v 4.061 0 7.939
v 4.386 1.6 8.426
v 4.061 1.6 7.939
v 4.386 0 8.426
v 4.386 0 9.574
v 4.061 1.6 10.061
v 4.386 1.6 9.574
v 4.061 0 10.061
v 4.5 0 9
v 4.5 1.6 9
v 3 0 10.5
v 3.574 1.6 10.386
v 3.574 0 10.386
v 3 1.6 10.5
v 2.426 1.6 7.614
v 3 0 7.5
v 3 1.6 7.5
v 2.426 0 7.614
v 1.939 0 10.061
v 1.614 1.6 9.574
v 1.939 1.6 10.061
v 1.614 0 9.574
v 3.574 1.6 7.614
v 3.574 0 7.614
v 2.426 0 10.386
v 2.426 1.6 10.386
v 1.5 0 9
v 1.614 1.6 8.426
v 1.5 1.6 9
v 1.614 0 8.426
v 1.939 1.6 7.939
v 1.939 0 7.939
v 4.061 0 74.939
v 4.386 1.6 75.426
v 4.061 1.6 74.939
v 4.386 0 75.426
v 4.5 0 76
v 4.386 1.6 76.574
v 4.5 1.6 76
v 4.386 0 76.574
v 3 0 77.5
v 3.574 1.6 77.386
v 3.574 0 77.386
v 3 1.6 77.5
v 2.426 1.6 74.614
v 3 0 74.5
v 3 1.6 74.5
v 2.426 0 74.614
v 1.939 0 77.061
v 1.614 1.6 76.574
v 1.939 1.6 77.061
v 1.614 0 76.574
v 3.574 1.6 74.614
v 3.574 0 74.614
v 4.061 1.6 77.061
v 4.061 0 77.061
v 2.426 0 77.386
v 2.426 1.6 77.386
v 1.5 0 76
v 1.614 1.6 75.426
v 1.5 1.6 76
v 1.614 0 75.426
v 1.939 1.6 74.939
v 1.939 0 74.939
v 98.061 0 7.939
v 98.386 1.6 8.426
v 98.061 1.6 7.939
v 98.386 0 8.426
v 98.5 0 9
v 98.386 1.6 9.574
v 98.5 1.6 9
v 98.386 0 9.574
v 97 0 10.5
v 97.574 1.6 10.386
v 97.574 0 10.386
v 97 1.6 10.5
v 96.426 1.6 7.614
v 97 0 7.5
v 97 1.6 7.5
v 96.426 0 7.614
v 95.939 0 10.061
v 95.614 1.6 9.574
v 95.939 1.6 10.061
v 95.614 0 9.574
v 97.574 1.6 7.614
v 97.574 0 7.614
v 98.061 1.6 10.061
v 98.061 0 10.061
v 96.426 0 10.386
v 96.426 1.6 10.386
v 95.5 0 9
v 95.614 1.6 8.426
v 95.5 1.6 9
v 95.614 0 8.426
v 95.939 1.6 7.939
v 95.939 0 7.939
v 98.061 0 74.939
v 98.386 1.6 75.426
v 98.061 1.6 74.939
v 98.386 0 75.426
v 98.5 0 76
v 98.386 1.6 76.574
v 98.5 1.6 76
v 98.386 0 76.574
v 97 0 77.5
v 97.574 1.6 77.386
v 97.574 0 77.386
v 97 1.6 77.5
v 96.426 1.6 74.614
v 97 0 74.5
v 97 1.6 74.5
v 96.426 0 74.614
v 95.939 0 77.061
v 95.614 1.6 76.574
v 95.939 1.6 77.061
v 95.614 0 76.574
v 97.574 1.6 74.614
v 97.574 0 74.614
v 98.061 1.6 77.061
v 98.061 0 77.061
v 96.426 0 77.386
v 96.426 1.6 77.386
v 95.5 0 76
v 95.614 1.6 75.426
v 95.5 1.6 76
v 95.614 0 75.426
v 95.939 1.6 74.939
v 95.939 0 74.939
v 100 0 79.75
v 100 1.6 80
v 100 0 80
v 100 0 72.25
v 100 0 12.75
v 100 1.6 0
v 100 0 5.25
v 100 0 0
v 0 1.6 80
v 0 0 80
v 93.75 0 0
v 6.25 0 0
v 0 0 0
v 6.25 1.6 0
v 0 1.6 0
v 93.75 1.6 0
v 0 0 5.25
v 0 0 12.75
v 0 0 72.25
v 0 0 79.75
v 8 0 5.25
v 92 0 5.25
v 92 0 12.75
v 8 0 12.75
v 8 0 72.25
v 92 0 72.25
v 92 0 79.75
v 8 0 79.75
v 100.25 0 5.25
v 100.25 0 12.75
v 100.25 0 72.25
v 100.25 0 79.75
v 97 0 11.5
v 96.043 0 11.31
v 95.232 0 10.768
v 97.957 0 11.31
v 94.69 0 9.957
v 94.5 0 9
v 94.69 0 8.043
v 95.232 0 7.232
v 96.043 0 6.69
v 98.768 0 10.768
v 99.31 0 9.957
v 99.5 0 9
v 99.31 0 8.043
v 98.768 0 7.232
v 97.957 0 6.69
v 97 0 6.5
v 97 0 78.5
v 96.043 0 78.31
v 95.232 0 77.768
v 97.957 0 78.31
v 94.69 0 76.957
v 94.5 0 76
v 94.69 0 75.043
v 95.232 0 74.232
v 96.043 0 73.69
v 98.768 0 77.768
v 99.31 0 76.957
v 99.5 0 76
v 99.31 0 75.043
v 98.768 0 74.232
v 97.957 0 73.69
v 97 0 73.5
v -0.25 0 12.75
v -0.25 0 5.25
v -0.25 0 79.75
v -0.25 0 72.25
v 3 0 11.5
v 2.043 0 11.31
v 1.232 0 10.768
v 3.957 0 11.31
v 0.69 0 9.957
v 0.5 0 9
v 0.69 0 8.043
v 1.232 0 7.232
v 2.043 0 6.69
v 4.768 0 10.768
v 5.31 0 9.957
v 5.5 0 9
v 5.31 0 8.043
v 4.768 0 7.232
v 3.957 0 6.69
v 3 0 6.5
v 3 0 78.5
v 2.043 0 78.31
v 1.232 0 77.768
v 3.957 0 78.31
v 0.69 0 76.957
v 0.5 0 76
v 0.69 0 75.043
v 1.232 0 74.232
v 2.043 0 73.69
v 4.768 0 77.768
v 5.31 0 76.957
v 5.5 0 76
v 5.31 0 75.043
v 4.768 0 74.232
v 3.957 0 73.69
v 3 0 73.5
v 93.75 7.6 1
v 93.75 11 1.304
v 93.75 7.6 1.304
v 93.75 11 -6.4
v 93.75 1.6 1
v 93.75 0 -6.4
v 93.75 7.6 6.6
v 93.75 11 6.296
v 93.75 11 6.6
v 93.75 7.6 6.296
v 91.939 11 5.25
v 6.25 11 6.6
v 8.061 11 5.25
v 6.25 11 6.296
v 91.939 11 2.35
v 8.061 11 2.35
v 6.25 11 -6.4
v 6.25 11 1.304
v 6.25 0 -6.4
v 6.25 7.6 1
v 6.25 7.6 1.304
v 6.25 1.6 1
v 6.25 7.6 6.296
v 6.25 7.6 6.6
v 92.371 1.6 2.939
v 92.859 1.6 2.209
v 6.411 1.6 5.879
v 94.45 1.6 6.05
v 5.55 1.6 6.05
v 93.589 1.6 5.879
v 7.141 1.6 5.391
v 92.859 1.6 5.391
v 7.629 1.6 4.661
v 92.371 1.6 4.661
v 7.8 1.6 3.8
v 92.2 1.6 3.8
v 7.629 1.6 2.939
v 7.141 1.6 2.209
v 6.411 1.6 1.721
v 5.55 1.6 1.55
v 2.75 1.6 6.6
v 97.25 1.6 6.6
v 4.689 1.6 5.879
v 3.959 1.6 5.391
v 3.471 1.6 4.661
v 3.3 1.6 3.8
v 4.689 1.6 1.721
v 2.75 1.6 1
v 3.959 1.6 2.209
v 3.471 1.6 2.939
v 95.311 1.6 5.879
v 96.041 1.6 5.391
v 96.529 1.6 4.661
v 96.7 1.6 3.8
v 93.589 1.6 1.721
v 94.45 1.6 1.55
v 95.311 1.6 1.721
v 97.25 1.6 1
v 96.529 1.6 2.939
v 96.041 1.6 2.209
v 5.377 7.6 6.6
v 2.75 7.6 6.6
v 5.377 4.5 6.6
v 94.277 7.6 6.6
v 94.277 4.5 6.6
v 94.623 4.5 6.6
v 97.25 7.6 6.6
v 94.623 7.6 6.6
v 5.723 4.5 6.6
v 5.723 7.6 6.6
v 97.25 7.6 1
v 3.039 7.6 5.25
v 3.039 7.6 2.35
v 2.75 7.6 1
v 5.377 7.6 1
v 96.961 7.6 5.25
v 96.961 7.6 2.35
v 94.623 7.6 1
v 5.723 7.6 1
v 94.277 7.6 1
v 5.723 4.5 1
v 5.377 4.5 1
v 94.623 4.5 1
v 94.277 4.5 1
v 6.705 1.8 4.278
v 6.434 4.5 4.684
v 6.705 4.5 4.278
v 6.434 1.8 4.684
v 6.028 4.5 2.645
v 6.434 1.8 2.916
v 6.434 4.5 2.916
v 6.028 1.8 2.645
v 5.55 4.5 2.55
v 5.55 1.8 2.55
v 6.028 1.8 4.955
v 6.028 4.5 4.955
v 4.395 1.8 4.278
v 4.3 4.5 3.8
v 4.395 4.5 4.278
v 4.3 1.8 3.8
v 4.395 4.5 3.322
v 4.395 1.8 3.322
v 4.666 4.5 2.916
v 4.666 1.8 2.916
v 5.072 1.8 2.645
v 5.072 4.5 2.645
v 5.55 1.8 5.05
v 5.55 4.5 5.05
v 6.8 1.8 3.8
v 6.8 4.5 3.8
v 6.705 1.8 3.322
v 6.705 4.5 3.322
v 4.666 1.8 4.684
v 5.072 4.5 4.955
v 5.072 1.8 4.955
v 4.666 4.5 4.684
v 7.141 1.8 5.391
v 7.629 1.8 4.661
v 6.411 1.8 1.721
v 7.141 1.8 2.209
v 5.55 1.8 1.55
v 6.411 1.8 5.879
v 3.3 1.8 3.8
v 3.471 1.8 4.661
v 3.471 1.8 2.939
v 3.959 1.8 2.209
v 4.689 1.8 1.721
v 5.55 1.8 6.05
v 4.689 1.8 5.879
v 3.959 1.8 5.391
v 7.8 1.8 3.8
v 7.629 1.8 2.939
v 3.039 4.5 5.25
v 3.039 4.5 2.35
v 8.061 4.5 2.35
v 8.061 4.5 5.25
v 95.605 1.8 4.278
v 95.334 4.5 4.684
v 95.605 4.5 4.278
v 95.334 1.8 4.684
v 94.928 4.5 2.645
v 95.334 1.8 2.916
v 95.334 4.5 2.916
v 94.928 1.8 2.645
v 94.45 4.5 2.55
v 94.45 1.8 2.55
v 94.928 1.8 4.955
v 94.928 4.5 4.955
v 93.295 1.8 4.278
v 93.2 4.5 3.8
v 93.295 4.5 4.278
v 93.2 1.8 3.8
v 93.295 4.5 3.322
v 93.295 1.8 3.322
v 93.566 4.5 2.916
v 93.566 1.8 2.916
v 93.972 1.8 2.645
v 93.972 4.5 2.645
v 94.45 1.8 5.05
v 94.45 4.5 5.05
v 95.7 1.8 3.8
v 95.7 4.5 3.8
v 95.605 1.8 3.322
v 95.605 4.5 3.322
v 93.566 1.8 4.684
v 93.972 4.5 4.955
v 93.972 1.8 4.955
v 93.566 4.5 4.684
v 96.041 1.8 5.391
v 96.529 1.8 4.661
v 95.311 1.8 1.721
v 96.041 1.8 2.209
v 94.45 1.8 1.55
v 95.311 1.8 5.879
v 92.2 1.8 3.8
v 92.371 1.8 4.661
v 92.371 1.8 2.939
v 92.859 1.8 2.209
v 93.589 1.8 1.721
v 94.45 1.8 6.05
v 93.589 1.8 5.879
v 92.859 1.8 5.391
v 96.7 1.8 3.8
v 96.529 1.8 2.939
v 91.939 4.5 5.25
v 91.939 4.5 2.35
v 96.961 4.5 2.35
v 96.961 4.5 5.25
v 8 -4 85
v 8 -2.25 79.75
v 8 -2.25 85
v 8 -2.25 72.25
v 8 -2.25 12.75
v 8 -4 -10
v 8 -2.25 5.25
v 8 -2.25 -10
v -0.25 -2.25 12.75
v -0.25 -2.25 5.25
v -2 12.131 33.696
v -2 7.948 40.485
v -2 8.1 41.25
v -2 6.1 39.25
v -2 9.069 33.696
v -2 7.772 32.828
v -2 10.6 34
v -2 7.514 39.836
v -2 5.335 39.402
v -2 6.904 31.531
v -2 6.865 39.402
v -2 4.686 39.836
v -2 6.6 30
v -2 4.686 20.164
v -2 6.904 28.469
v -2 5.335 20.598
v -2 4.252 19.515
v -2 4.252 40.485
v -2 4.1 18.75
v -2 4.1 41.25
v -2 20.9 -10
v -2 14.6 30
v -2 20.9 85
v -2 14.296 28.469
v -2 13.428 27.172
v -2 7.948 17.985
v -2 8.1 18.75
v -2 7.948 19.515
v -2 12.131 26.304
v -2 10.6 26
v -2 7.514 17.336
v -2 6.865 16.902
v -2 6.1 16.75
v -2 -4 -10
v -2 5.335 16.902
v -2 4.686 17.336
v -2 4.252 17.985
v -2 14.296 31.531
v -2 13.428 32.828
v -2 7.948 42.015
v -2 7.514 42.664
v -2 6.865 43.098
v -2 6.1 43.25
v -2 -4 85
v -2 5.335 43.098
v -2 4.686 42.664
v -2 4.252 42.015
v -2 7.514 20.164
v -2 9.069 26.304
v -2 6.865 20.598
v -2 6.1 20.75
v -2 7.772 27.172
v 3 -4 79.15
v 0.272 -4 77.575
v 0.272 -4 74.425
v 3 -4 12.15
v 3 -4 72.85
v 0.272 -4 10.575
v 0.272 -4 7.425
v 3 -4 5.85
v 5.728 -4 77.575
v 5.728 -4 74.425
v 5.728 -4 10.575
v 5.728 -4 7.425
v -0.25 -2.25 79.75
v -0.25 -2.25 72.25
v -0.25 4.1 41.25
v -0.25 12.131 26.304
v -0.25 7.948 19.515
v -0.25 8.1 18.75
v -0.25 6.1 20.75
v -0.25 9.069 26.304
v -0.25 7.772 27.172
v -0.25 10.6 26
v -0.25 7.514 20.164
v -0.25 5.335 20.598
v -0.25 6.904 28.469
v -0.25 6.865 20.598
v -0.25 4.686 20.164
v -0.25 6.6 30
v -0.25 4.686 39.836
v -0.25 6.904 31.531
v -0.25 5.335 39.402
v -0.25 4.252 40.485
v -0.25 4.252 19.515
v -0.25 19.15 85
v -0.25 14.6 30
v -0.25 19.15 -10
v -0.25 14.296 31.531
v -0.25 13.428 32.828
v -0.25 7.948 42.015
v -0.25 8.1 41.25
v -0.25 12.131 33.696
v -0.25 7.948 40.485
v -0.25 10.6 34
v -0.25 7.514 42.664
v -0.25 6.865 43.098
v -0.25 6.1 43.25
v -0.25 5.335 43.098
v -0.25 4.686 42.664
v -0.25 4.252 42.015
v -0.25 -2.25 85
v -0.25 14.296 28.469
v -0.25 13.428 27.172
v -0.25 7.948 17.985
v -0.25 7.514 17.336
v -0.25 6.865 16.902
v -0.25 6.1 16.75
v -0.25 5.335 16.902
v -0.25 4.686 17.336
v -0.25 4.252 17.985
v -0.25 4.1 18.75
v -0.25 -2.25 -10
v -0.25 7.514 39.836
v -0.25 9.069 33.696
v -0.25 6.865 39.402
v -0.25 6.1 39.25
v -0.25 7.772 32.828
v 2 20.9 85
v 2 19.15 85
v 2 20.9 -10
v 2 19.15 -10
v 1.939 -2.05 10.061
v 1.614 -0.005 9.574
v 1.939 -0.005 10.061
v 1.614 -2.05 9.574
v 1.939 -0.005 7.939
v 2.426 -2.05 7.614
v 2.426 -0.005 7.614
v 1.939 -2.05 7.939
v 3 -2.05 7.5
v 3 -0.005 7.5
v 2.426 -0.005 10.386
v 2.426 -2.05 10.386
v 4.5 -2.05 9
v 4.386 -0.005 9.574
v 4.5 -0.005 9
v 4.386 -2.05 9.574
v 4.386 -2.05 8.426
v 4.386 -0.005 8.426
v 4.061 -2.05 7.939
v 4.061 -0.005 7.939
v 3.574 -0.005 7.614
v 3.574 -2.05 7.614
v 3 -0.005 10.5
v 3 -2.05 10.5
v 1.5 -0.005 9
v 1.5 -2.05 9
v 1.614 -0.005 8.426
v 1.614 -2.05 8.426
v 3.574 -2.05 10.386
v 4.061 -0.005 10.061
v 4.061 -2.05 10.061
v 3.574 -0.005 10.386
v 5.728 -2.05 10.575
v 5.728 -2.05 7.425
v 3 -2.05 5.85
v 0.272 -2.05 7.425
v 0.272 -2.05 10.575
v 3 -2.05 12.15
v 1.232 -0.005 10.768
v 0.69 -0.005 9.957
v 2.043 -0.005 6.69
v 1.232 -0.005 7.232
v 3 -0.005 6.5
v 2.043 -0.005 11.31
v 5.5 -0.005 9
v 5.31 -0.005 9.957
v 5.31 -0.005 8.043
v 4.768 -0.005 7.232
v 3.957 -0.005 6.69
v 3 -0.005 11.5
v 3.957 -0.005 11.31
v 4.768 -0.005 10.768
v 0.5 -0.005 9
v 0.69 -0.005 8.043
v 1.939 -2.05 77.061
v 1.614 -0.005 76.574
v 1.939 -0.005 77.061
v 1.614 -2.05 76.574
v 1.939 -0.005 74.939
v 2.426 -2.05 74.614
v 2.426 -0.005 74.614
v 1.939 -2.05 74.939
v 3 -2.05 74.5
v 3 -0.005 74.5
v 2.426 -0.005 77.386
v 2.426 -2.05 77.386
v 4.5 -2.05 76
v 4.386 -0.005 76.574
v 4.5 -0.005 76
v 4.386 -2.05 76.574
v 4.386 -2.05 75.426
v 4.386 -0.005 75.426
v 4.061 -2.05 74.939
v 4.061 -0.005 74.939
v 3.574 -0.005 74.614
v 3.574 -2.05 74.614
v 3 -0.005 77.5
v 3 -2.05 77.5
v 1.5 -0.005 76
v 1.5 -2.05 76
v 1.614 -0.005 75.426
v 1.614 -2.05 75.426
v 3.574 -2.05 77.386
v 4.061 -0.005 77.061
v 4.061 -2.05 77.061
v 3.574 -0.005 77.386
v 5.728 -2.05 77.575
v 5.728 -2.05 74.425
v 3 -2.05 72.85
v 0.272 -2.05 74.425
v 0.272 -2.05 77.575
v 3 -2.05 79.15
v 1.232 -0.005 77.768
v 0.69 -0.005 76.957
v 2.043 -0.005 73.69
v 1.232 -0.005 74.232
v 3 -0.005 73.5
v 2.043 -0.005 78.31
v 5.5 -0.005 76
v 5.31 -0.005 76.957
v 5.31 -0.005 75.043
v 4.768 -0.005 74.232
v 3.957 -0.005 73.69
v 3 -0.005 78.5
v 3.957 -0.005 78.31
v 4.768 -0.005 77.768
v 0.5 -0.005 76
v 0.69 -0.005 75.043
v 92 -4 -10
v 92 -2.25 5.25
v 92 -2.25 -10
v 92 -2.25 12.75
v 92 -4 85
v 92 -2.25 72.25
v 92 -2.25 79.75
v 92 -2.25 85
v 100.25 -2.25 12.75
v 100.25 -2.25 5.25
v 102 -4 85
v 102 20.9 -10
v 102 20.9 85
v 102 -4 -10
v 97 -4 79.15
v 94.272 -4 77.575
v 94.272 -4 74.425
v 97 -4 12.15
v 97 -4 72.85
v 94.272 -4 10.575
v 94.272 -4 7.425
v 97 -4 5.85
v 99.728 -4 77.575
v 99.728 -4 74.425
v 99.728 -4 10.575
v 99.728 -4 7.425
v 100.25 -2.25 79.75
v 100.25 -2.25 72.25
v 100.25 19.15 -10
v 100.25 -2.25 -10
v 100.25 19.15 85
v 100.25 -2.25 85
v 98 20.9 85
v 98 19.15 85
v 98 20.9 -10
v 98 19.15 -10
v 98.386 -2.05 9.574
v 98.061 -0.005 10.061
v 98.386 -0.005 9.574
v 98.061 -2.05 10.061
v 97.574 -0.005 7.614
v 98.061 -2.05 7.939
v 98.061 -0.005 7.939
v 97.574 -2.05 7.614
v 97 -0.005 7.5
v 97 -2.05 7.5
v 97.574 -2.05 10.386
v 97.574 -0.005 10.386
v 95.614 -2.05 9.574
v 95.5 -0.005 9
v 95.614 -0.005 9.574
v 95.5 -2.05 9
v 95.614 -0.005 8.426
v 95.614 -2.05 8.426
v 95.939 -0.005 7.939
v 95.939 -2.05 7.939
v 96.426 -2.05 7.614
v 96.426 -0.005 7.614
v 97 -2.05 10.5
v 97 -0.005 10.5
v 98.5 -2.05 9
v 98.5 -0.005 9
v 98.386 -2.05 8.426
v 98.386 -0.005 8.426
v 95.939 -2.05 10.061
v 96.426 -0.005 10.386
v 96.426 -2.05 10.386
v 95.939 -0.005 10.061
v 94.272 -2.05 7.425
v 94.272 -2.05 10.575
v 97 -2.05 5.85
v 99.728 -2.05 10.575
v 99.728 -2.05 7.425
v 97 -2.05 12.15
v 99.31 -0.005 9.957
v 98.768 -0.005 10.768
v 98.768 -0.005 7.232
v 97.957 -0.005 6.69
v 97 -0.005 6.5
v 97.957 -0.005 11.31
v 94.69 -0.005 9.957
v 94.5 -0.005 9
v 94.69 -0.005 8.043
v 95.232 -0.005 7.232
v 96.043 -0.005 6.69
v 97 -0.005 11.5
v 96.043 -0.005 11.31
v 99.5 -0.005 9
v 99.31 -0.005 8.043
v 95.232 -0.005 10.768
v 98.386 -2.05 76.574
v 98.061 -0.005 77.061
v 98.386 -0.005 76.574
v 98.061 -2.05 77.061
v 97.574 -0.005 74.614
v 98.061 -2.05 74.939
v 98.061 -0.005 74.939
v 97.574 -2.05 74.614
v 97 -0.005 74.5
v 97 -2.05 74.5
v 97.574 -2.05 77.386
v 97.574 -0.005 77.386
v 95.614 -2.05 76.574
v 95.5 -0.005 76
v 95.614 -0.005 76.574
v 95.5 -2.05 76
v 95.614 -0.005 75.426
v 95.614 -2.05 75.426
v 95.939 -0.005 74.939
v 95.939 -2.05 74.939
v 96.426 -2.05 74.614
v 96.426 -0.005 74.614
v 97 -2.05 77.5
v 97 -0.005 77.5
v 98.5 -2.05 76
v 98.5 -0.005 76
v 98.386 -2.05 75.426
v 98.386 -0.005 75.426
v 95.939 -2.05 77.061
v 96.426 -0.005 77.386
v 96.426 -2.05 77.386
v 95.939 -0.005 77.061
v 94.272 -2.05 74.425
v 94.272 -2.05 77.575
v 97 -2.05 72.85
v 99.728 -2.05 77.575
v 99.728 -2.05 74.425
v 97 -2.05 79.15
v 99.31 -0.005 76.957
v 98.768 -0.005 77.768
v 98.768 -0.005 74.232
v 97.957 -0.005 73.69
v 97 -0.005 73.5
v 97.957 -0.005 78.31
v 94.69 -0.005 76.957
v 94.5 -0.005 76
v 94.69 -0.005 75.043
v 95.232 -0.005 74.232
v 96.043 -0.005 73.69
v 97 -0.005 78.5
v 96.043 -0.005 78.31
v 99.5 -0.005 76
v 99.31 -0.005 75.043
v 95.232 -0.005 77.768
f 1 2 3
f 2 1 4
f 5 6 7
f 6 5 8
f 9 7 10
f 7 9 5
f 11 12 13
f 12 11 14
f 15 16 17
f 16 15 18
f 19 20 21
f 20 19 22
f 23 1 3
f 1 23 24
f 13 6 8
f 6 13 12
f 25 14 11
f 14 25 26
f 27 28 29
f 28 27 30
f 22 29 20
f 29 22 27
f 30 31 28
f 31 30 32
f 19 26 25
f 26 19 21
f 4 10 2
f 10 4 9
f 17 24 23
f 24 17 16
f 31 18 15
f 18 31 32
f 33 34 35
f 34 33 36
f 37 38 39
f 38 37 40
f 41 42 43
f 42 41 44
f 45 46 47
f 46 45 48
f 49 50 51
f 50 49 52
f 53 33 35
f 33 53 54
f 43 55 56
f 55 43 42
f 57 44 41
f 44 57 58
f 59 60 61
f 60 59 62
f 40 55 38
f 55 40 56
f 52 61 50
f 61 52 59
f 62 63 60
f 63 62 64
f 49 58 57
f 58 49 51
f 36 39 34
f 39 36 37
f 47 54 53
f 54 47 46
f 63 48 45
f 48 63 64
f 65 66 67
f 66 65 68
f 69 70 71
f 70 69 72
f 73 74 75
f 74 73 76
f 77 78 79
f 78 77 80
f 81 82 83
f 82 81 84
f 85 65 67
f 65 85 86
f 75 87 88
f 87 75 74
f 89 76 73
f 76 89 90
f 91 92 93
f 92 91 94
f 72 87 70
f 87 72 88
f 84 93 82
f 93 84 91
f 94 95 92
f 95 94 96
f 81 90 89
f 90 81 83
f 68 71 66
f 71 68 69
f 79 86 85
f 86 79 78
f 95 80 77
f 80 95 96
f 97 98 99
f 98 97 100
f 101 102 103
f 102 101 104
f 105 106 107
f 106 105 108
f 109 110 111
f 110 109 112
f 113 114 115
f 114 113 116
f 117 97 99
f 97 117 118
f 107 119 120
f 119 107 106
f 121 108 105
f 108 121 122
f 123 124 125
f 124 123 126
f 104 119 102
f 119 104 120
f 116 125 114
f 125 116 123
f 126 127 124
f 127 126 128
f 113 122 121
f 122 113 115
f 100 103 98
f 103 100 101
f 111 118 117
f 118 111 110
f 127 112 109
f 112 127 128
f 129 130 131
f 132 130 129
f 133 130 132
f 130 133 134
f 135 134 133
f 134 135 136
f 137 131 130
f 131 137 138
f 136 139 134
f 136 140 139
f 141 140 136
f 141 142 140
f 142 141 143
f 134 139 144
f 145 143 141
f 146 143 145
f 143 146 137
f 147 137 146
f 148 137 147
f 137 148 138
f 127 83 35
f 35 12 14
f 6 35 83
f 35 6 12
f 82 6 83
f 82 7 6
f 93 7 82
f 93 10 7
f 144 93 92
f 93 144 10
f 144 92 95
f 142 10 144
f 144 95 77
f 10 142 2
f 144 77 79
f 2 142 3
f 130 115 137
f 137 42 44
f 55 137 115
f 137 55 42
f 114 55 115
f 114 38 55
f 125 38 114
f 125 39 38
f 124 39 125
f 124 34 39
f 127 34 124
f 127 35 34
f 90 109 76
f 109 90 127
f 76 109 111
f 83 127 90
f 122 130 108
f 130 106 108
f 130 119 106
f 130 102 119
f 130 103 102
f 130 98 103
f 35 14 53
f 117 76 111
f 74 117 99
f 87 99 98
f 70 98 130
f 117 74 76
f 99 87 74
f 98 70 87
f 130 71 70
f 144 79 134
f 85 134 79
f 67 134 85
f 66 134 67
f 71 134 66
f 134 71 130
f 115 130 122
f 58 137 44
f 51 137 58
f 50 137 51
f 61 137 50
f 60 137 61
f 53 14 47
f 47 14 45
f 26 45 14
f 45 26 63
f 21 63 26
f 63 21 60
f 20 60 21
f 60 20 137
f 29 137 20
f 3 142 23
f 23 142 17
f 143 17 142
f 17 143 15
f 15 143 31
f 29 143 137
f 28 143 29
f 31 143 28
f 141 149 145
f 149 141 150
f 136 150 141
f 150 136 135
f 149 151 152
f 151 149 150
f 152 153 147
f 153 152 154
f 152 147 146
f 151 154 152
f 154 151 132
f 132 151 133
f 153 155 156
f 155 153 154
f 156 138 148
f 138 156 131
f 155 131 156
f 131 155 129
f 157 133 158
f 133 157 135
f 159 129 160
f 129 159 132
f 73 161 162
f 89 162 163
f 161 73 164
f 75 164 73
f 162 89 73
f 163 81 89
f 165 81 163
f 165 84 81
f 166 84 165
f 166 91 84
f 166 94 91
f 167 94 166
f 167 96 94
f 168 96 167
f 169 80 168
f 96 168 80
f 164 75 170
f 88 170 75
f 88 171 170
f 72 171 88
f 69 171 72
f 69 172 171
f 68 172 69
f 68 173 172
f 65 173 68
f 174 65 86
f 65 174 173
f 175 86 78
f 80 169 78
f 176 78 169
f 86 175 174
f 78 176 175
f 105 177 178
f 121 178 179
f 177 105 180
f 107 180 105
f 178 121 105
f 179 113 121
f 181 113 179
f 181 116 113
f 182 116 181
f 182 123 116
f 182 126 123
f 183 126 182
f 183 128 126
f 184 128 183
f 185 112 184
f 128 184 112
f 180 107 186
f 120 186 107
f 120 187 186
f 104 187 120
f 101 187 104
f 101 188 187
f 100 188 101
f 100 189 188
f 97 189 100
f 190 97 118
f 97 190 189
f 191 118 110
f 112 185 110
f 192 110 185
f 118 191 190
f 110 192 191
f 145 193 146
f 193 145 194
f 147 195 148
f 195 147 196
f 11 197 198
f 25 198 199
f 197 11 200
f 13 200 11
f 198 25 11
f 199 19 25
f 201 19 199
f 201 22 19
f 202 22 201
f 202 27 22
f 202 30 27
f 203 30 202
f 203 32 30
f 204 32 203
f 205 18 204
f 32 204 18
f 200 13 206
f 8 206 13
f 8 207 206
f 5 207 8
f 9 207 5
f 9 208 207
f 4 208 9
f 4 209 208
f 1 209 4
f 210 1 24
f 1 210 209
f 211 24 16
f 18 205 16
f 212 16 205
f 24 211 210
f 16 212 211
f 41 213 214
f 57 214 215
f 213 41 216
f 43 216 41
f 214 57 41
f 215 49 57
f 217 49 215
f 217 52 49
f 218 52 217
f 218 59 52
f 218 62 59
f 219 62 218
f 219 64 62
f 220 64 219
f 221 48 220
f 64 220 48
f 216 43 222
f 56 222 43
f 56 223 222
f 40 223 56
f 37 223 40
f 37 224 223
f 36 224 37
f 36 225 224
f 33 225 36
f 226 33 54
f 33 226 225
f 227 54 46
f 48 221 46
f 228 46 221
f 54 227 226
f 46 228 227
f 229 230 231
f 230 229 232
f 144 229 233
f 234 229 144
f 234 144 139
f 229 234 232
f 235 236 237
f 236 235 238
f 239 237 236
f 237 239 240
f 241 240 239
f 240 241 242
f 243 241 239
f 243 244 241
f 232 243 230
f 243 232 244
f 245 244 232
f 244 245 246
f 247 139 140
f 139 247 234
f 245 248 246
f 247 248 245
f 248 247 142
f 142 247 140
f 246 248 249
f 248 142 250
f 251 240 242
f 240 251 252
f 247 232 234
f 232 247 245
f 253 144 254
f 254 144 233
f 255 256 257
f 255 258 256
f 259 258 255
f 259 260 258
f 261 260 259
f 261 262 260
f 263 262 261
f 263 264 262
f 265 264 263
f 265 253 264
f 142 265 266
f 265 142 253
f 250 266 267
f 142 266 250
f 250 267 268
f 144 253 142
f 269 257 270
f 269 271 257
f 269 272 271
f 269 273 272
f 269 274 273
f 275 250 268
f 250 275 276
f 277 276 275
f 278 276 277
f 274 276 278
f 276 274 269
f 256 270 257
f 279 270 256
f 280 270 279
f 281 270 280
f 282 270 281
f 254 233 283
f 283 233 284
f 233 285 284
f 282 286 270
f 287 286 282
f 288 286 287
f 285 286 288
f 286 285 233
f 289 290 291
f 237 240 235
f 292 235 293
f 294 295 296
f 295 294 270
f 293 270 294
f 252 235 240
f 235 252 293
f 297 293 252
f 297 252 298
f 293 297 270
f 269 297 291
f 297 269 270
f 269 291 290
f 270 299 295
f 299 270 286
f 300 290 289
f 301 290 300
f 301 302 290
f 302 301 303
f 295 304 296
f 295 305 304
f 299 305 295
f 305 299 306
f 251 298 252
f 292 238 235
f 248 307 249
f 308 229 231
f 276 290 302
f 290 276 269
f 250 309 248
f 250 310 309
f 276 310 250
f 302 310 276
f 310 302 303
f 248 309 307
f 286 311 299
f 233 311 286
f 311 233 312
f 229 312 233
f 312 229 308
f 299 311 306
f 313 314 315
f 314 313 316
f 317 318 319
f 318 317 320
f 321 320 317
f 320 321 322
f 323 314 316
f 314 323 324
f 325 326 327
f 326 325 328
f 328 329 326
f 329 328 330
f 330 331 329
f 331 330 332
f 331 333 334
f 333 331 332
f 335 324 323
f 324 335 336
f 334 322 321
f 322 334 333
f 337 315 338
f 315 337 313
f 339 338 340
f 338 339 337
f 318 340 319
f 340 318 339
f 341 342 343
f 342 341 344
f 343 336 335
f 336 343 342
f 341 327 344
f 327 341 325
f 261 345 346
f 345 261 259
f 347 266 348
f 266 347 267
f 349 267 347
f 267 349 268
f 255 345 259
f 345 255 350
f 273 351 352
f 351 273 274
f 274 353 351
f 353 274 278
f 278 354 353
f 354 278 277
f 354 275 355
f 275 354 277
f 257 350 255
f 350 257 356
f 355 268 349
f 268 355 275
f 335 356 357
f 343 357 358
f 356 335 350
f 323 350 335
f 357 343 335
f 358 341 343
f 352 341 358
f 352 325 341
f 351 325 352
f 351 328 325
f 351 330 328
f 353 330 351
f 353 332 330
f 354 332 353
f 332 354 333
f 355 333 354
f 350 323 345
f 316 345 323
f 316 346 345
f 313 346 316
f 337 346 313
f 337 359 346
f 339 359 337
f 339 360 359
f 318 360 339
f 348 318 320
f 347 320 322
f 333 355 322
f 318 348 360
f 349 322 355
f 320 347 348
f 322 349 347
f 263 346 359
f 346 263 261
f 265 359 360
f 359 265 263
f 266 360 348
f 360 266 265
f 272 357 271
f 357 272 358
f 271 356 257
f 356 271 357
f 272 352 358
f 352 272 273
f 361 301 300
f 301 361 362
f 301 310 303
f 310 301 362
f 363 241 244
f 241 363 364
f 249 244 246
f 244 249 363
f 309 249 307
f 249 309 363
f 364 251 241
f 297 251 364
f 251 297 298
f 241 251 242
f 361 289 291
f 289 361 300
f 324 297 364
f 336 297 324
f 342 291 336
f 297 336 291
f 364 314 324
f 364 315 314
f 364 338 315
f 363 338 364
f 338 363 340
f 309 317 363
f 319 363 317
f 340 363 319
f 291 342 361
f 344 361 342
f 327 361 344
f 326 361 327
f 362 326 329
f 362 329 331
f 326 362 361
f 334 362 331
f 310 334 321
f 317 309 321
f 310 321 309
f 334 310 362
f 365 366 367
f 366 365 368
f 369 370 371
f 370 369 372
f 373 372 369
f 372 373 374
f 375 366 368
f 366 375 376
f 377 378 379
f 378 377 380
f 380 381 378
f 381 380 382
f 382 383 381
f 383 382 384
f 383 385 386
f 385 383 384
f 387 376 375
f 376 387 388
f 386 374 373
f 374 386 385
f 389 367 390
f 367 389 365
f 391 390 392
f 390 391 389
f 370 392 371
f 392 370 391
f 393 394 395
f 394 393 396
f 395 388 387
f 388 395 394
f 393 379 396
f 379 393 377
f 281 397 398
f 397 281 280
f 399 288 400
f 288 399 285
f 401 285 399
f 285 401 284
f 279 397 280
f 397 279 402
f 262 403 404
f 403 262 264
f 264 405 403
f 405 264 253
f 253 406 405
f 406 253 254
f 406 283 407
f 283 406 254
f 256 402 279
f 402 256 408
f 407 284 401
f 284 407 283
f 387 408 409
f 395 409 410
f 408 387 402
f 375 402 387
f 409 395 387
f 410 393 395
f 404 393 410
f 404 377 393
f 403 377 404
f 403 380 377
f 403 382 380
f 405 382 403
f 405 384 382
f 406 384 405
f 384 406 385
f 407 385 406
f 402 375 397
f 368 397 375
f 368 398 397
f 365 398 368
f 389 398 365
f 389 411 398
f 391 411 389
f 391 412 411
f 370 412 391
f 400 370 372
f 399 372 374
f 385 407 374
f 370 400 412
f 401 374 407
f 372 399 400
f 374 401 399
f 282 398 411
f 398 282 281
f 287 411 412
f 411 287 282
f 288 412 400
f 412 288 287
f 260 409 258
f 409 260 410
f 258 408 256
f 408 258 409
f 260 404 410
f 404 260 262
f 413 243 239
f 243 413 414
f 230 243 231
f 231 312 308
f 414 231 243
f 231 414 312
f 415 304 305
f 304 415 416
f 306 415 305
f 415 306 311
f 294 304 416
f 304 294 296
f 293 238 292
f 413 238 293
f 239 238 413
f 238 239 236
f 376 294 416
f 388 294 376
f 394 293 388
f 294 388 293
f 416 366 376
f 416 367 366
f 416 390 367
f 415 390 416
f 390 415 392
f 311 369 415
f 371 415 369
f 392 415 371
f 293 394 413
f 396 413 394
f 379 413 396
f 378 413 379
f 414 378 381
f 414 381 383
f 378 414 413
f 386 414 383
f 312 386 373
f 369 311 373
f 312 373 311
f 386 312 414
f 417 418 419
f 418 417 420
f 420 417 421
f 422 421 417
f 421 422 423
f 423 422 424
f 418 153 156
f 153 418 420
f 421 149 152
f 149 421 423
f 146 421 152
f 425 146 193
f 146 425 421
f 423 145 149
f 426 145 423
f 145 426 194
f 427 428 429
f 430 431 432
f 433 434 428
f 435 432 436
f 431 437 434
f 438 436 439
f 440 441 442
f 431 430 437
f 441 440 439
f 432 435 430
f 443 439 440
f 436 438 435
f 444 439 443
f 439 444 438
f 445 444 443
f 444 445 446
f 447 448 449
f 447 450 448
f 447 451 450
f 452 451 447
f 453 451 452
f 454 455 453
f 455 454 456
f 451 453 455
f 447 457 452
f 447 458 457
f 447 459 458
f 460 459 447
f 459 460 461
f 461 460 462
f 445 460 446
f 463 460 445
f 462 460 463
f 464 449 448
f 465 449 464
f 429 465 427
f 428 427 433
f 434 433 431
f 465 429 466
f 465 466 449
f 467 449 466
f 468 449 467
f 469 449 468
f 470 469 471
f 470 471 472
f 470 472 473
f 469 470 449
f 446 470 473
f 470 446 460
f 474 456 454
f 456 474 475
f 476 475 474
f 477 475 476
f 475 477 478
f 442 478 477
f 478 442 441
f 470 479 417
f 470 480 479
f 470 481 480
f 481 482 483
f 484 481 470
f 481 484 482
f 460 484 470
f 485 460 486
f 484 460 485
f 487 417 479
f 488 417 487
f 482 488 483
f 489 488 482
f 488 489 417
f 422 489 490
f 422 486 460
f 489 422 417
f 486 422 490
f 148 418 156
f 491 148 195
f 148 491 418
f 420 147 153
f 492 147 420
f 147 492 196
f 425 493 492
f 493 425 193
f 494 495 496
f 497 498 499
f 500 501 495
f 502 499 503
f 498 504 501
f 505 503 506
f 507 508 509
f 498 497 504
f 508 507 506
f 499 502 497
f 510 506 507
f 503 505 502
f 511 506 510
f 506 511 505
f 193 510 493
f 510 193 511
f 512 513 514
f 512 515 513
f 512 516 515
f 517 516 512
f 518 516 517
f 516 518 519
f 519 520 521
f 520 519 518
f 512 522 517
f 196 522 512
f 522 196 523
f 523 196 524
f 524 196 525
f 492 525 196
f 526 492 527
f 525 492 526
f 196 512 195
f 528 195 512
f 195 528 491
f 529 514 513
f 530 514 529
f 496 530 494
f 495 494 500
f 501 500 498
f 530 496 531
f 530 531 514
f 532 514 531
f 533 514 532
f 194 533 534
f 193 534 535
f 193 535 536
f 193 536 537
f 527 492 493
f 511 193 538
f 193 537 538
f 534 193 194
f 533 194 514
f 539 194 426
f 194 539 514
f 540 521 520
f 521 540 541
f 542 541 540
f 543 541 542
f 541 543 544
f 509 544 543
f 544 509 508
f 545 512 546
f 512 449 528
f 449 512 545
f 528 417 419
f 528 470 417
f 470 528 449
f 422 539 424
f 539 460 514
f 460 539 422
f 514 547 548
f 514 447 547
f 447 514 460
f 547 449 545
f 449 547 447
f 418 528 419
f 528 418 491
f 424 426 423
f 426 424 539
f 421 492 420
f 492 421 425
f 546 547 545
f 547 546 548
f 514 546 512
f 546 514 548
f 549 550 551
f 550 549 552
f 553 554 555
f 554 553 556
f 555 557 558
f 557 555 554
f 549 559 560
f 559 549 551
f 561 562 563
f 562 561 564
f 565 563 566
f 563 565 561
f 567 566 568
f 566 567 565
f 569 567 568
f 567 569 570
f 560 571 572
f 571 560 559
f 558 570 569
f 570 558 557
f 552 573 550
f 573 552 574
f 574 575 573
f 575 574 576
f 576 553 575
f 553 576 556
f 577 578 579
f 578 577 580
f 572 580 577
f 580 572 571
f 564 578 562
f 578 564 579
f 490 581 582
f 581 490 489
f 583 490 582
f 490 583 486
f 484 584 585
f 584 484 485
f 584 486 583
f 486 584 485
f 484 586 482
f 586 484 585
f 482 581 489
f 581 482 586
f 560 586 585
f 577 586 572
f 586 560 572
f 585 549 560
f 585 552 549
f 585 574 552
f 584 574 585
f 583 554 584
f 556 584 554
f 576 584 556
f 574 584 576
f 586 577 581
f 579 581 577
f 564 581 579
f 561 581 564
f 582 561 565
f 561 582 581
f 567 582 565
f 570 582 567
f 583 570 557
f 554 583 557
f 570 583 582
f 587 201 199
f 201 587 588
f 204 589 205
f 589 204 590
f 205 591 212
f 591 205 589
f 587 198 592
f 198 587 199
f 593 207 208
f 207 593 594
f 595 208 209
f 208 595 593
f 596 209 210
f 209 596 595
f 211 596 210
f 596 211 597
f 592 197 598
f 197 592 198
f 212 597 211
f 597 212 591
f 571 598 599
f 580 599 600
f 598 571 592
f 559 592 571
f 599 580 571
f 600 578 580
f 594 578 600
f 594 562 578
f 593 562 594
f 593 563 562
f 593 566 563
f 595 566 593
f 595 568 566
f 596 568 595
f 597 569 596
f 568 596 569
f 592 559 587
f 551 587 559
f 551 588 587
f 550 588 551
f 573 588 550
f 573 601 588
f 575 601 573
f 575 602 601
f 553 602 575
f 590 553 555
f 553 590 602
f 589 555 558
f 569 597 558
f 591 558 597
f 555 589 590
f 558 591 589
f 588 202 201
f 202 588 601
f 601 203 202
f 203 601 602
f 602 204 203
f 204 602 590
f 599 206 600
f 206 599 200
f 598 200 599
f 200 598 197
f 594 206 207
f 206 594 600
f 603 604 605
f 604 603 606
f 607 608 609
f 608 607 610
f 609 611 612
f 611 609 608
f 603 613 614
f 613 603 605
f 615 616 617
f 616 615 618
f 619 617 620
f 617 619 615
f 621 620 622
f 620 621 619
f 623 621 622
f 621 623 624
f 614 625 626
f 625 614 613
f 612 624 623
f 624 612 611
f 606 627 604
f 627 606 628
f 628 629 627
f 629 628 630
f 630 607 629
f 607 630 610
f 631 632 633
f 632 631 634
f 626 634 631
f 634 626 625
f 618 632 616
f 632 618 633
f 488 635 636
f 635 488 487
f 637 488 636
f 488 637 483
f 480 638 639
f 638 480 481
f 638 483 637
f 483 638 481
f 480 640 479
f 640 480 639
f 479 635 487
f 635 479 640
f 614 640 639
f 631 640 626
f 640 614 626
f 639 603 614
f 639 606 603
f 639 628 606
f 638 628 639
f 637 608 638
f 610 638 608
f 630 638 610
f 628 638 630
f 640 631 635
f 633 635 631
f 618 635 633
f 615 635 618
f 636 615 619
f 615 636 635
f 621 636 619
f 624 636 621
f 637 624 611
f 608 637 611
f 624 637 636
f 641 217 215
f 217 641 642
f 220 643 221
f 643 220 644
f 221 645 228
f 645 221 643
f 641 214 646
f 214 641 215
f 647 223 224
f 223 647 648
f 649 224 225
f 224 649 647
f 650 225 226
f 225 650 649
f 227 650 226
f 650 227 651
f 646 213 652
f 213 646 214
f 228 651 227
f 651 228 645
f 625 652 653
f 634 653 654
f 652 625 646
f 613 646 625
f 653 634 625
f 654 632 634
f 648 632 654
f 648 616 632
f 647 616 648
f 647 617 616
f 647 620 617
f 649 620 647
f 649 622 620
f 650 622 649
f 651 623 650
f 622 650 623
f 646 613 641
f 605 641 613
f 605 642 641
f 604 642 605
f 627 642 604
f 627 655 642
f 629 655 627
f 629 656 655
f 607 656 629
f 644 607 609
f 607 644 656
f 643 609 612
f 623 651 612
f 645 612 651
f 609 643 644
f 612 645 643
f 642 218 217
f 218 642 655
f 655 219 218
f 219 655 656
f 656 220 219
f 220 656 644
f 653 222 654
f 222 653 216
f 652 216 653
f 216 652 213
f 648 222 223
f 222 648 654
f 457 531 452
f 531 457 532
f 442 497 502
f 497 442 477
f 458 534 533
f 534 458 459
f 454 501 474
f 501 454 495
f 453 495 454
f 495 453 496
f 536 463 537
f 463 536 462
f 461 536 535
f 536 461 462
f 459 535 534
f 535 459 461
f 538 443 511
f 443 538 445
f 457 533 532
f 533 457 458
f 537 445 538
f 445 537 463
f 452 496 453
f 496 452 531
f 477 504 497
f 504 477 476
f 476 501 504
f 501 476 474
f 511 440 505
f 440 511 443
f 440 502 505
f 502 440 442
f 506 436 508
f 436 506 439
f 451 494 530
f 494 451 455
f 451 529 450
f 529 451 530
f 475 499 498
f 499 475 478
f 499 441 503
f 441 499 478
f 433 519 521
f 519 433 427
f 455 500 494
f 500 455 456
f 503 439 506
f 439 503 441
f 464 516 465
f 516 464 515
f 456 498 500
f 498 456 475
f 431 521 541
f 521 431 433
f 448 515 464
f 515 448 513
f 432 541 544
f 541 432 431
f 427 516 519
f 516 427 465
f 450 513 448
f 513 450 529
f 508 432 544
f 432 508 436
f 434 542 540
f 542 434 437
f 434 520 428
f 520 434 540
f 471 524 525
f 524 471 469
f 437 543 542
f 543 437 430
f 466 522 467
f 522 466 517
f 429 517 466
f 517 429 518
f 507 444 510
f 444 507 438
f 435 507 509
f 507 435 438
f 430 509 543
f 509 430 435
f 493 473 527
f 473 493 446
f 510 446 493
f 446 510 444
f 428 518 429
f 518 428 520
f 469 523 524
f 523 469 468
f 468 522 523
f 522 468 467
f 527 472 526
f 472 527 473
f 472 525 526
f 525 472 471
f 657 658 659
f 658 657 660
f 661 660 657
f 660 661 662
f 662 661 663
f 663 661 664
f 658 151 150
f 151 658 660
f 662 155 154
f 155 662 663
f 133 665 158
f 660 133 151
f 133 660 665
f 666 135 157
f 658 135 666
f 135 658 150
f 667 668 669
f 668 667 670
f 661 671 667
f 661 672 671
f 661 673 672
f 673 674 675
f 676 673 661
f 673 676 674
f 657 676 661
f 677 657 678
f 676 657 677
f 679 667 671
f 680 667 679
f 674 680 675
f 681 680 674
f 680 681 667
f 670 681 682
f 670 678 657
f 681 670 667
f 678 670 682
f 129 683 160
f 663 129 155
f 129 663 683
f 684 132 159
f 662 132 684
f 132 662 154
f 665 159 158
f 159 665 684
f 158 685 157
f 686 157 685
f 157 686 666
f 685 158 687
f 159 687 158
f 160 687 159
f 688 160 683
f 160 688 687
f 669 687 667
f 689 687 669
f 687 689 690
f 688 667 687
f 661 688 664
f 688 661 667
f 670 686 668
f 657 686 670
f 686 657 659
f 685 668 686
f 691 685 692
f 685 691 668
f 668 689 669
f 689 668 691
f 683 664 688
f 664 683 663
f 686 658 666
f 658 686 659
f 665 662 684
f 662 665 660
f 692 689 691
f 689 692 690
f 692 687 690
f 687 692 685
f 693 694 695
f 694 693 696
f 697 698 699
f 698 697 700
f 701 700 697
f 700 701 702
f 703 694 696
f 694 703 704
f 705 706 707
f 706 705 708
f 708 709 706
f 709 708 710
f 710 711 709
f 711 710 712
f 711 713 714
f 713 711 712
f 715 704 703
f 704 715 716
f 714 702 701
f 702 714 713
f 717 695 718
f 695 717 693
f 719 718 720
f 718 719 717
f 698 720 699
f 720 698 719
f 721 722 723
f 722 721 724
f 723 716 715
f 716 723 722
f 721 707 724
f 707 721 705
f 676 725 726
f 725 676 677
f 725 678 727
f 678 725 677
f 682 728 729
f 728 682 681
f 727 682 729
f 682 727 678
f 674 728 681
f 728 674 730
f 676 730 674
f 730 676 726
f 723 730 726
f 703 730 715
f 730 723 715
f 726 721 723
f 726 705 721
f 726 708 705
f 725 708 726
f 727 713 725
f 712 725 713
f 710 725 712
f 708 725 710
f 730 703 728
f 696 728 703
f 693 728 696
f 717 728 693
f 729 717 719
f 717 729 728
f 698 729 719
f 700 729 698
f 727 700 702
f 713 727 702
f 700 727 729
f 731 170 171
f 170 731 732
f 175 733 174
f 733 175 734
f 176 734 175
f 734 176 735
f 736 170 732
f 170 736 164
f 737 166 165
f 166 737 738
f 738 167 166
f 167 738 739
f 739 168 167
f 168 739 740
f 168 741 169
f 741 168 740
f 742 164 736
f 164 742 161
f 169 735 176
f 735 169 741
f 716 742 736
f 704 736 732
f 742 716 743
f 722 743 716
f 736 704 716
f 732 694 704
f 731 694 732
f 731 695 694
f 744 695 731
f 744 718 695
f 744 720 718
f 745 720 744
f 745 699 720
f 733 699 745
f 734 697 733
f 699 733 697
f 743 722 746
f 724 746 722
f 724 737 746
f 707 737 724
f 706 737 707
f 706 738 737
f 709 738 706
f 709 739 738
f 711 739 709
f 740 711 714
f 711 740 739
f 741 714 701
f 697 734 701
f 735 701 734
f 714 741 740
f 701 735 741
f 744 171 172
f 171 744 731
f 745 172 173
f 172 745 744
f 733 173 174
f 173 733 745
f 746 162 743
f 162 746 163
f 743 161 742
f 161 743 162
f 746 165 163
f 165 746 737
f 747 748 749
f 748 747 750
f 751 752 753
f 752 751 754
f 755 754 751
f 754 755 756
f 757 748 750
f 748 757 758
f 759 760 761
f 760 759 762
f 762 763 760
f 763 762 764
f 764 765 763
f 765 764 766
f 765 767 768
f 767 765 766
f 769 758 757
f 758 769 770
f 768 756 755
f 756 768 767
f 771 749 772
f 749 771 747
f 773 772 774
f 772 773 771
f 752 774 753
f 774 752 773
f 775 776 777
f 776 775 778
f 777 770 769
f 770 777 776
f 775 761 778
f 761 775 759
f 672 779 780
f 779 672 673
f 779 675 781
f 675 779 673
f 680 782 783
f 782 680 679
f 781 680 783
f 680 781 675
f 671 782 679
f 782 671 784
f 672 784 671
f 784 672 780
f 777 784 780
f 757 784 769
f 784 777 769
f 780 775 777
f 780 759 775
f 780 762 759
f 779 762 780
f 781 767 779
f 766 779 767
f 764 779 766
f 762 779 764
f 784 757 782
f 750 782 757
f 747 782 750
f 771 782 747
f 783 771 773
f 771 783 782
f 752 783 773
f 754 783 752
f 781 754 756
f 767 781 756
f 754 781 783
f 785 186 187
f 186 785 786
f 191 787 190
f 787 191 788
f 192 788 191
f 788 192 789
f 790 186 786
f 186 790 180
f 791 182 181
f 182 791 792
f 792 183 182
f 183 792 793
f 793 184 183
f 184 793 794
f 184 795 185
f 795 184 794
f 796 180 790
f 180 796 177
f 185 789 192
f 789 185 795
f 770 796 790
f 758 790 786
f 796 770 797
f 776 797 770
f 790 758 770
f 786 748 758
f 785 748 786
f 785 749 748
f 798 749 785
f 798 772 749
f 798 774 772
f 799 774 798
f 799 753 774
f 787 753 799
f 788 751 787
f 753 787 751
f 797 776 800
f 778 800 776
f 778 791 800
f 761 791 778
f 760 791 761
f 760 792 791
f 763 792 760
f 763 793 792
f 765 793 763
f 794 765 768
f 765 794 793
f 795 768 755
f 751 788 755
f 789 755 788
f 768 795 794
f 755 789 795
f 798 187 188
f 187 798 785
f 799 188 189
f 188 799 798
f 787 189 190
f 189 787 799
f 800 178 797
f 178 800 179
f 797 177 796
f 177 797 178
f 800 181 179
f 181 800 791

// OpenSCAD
// file: ../library/din41612/din41612_male.scad
// din41612 male connector
// =======================

include <din41612_male_dim.scad>

use <../linurs/linurs_screw.scad>

module din41612_male(){ 
  // color("LightGrey")
  difference(){
    union(){
        translate([0,din41612_male_w1/2,din41612_male_h/2-din41612_male_h1])  
        cube([din41612_male_l1,
              din41612_male_w1,
              din41612_male_h],
             center=true);  
      translate([0,(din41612_male_w1-din41612_male_w)/2,(din41612_male_h-din41612_male_h1)/2]) 
        cube([din41612_male_l1,
              (din41612_male_w-din41612_male_w1),
              din41612_male_h-din41612_male_h1],
             center=true);  
      translate([0,din41612_male_w2/2+din41612_male_w1-din41612_male_w,din41612_male_h2/2])
        cube([din41612_male_l,
              din41612_male_w2,
              din41612_male_h2],
             center=true);  
    }
    for(i=[-1,1]){ // mounting holes
      translate([i*din41612_male_dl/2,
                 din41612_male_w1-din41612_male_w+din41612_male_w2/2, 
                 din41612_male_h1])
      rotate([180,0,90])screw_fix(
            w=din41612_male_h2, 
            d=M2_5, 
            type=head_cyl, 
            nut_sink=din41612_male_h,
            t=0);
    }
  }
}
din41612_male();  
// file: ../library/din41612/din41612_male_dim.scad
include <../linurs/linurs_screw_dim.scad>

// connector dimensions
din41612_male_l=94.5;    // lenght of the connector
din41612_male_l1=87.5;   // 
din41612_male_w=13;      // width of the connector
din41612_male_w1=6.4;    // 
din41612_male_w2=5.6;    // 
din41612_male_h=11;      // height of the connector
din41612_male_h1=1.6;    // 
din41612_male_h2=6;      // 

din41612_male_dl=88.9;   // distance between mounting holes
// file: ../library/din41612/din41612_female_dim.scad
include <../linurs/linurs_screw_dim.scad>

// connector dimensions
din41612_female_l=95;       // lenght of the connector
din41612_female_l1=85;      // lenght of the connector head
din41612_female_h=11.6;     // height of the connector
din41612_female_h1=5.2;     // height produced by the connector when pulgged in 
din41612_female_w=11;       // width of the connector
din41612_female_w1=8.5;     // width of the connector head

din41612_female_dl=90;      // distance between mounting holes
// file: ../pcb/pcb.scad
// pcb
// ===
// The pcb is the master object and has its 
// lower left corner solder side at the origin of the 
// coordinate system 

n=2;  // [1,2,3,4,5,6,7,8]
show_pcb="assemblies"; // [assemblies,assembly,pcb]

include <pcb_dim.scad>
include <../motherboard/motherboard_dim.scad>

use <../library/din41612/din41612_male.scad>

module pcb(){
  echo("pcb");  
  color("greenyellow")
  difference(){
    cube([pcb_l,pcb_h,pcb_w]); // pcb
    for(x=[-1,1]){ // mounting holes
      for(y=[pcb_wd1,pcb_wd1+pcb_wd]){
        translate([x*pcb_ld/2+pcb_l/2,0,y])
        rotate([90,0,0])
        cylinder(d=pcb_d,h=3*pcb_h,center=true,$fn=16);
      }
    }
  }
}

module pcb_assembly(){
  echo("pcb assembly");  
  pcb();  
  translate([pcb_l/2,pcb_h,0])  
  rotate([-90,0,0])din41612_male();  
}

module pcb_assemblies(n=1){
  echo("pcb assemblies"); 
  for(i=[0:n-1]){ // add the connectors
      echo(i);
      translate([0,step*i,0])
      pcb_assembly();
  }    
}    

if(show_pcb=="assemblies"){
  pcb_assemblies(n=n);
}

if(show_pcb=="assembly"){
  pcb_assembly();
}

if(show_pcb=="pcb"){
    // Move to center to create 2D drawings from top view 
    // with script OpenSCAD22d.py
    //
    rotate([90,0,180])
    //
    translate([-pcb_l/2,-pcb_h/2,-pcb_w/2])
    pcb();
}
// file: ../bracket/bracket.scad
// bracket
// =======
// A bracket of the elecbox module
// - type: 0 front bracket, 1 rear bracket
// - width 1..n in steps

// parameters for customizer
// bracket width
n=2; // [1,2,3,4,5,6,7,8]
// type
bracket="Front"; // [Front,Back]
// intermediate mounting holes
intermediate=false;  

include <../pcb/pcb_dim.scad>

include <../motherboard/motherboard_dim.scad>
include <../library/linurs/linurs_screw_dim.scad>
include <bracket_dim.scad>

use <../library/linurs/linurs_screw.scad>
    
module back_bracket(n=1, intermediate=false){
  mirror([1,0,0])       // mirror it if desired
  front_bracket(n=n, intermediate=intermediate); 
}
    
module front_bracket(n=1, intermediate=false){
  echo("bracket");  
  //color("White")
  intermediatestep=(intermediate)?step:0; 
  difference(){
    union(){
      translate([-bracket_h2/2-bracket_gap/2,
                 bracket_w(n)/2-bracket_w1,
                 bracket_l/2])  
      cube([bracket_h2,
            bracket_w(n),
            bracket_l],center=true); // create the bracket front
  
      translate([bracket_h/2-bracket_h2-bracket_gap/2,
                 bracket_t/2-bracket_w1,
                 bracket_l/2]) 
      cube([bracket_h,
            bracket_t,
            bracket_l],center=true); // U shape side of the screw
      
      translate([bracket_h1/2-bracket_h2-bracket_gap/2,
                 bracket_w(n)-bracket_w1-bracket_t/2,
                 bracket_l/2]) 
      cube([bracket_h1,
            bracket_t,
            bracket_l],center=true); // U shape where no screw  
      for(x=[1:n]){  // create the mounting hole cubes 
        for(z=[bracket_l1,
               bracket_l1+bracket_ld]){
          translate([ bracket_h/2-bracket_h2-bracket_gap/2,
                     -bracket_w1/2+(x-1)*intermediatestep,
                     z])
          cube([bracket_h,
                bracket_w1,
                bracket_l2],center=true);
        }
      }   
    }
    for(x=[1:n]){ // create the mounting hole 
      for(z=[bracket_l1,
             bracket_l1+bracket_ld]){
        translate([bracket_h3-bracket_h2-bracket_gap/2,
                  -bracket_w1/2+(x-1)*intermediatestep,
                   z])
        rotate([0,90,0])
        rotate([-90,0,0])
        screw_fix(w=bracket_w1,d=bracket_screw,type=head_no, t=bracket_screw_gap);
      }
    }
  }
}

if(bracket=="Front"){
  front_bracket(intermediate=intermediate,n=n);
}

if(bracket=="Back"){
  back_bracket(intermediate=intermediate,n=n);
}
// file: ../library/linurs/linurs_screw.scad
// Metric screws and nuts 
// urs@linurs.org 2019
// It is targeted for 3D printing applications. 
// To look realistic is not the goal (Example: Nuts do not have a hole)

include <linurs_screw_dim.scad>

d=0; //[0:M2_5,1:M3,2:M4,3:M5]
type=0;//[0:head_cyl,1:head_cnt,2:head_no,3:head_hex]
w=15; 
i=10;
nut_sink=0;
screw_sink=0; 
t=0.01;
fn=16;

/* [hex_bolt] */
show_hex_bolt=false;

/* [nut] */
show_nut=false;

/* [screw] */
show_screw=false;

/* [screw_fix] */
show_screw_fix=false;

/* [screw_cut] */
show_screw_cut=false;

/* [nut_cut] */
show_nut_cut=false;
wi=0; 
rot=false;

// functions used multiple times to position nuts and heads
function headh_cyl(d)=screw_cyl[d][1];  // height of cyl screw head
function headh_cnt(d)=screw_cyl[d][1];  // height of cnt screw head
function headh(d,type=head_cyl)=(type==head_cyl ? headh_cyl(d) : (type==head_cnt ? headh_cnt(d) : 0 )); // height of screw head 

function nuth(d)=screw_hex[d][2];   // height of hex nut

// head of a cylinder screw
module screw_head_cyl(d=M3, t=0)
{
  screwhd=screw_cyl[d][0]+t; // diameter of cylinder screw head
  cylinder(d=screwhd,h=headh(d=d, type=head_cyl), center=true,$fn=16); // screw head
}

// head of a countersunk screw
module screw_head_cnt(d=M3, t=0)
{
  screwd=screw_d[d]+t; 
  screwhd=screw_cnt[d][0]+t; // diameter of cylinder screw head
  cylinder(d1=screwd,d2=screwhd,h=headh(d=d,type=head_cnt), center=true,$fn=16); // screw head
}

// head of a hex screw
module screw_head_hex(d=M3, t=0)
{
    translate([0,0,-nuth(d)/2])nut(d=d, t=t);
}

// head of all screws
module screw_head(d=M3, type=head_cyl, t=0)
{ 
  if(type==head_cnt){
    screw_head_cnt(d=d, t=t);
  } else {
    if(type==head_cyl){
      screw_head_cyl(d=d, t=t);
    } else {
       if(type==head_hex){
           screw_head_hex(d=d, t=t); 
       } 
    }    
  }
}

// hex bolt 
module hex_bolt(d=M3, w=10, t=0)
{
  nutd=screw_hex[d][1]+t; // outer diameter of hex bolt
  cylinder(r=nutd/2,h=w+t, center=true,$fn=6); // nut
}

// nut 
module nut(d=M3, t=0)
{
  hex_bolt(d=d, w=nuth(d), t=t);    
}

// screw 
// w outer width of the screw = screw length + head 
module screw(w=10, d=M3, type=head_cyl, t=0){
  screwd=screw_d[d]+t;       // screw diameter
  cylinder(d=screwd, h=w, center=true,$fn=16); // screw thread length
  translate([0,0,w/2-headh(d=d,type=type)/2])
  screw_head(d=d,type=type, t=t);
}

// screw fix
// w outer width of the screw = screw length + head 
// sink additional material below to remove 
// raise additional material above to remove
module screw_fix(w=10, d=M3, type=head_cyl, screw_sink=0, nut_sink=0, t=0){
  screw(w=w, d=d, type=type, t=t);
  translate([0,0,-w/2+nuth(d)/2])
    nut(d=d,t=t);
  //additional material to be removed above the nut  
  translate([0,0,-(w+nut_sink)/2])hex_bolt(d=d,w=nut_sink+0.01,t=t);    
  //additional material to be removed above the screw head
  if(type==head_cnt){  
    translate([0,0,w/2+screw_sink])
    cylinder(d=screw_cnt[d][0]+t,h=screw_sink+0.01,center=true,$fn=16);
  }else{ 
    translate([0,0,(w+screw_sink)/2])
    cylinder(d=screw_cyl[d][0]+t,h=screw_sink+0.01,center=true,$fn=16);
  }     
}

// screw cut
// material to be extracted from object to slide in a counter sunk screw for fixation
// w height of the cut out
// i depth of the screw
module screw_cut(d=M3,w=20,i=10,t=0,fn=32){
    hsh=screw_cnt[d][1];
    ws=screw_cnt[d][0]+t;
    ds=screw_d[d]+t;
    
    translate([i/2,0,-(w-hsh)/2])
      cube([i,ws,hsh],center=true);
    
    translate([0,0,-(w-hsh)/2])
      cylinder(d=ws,h=hsh,center=true,$fn=32);
    
    translate([0,0,-(w-hsh)/2+hsh])
        cylinder(d2=ds, d1=ws, h=hsh,center=true,$fn=fn);
    
    cylinder(h=w, d=ds, center=true, $fn=fn);   
    
    translate([i/2,0,0]) 
        cube([i,ds,w],center=true);
    
    for(y=[-1,1]){
        translate([i/2,y*ds/2,-w/2+hsh])
            rotate([45,0,0])
            cube([i,sqrt(2)*(ws-ds)/2,sqrt(2)*(ws-ds)/2],center=true);
    }
}
//screw_cut();

// nut cut
// material to be extracted from object to slide in a nut for fixation
// w height of the cylinder
// i lenght of the inlet
module nut_cut(w=10, wi=0, d=M3, i=10, t=0, rot=false,type=head_cyl){ 
  r=(rot)?90:0;
  ds=(rot)?screw_hex[d][1]:screw_hex[d][0];
  rotate([0,0,r])nut(d,t);
  translate([i/2,0,0])
    cube([i,ds+t,nuth(d)+t],center=true);
  translate([0,0,-wi])
      if(type==head_cnt){    
          screw(w=w, d=d, type=type, t=t); 
        translate([0,0,w/2])
          cylinder(d=screw_cnt[d][0]+t,h=raise,center=true,$fn=16);
      }
      else{ 
          screw(w=w, d=d, type=type, t=t);   
  //      translate([0,0,0])
          //#cylinder(d=screw_cyl[d][0]+t,h=w,center=true,$fn=16);
      }       
}

if(show_hex_bolt==true){
   hex_bolt(d=d, w=w, t=t);
}

if(show_nut==true){
  nut(d=d, t=t);
}    

if(show_screw==true){
   screw(w=w, d=d, type=type, t=t);
}

if(show_screw_fix==true){
  screw_fix(w=w, d=d, type=type, nut_sink=nut_sink, screw_sink=screw_sink, t=t);
}

if(show_screw_cut==true){
  screw_cut(d=d,w=w,i=i,t=t,$fn=fn);
}    

if(show_nut_cut==true){
  nut_cut(w=w, wi=wi, d=d, i=i, t=t,rot=rot,type=type);
}  
// file: ../library/linurs/linurs_screw_dim.scad
// Metric screws and nuts 
// urs@linurs.org

// contains dimensions of linurs_screw and can be included in other 
// OpenScad files 

// Parameters in this file
// d screw diameter M2_5, M3, ... (enumeration with screw_d)
// t millimeters added to diameters 

// enumerations of metric threads
M2_5=0;
M3=1;
M4=2;
M5=3;

// enumerations screw head type
head_cyl=0; // cylinder
head_cnt=1; // countrsunk
head_no=2;  // no head at all
head_hex=3;  // no head at all

// screw diameters
screw_d=[
2.5, // M2.5
3.0, // M3
4.0, // M4
5.0  // M5
];

// sizes for hex nuts
screw_hex=[
//   s,   e,   h
 [ 5.0, 5.8, 1.7], // M2.5
 [ 5.5, 6.4, 2.0], // M3
 [ 7.0, 8.1, 2.8], // M4
 [ 8.0, 9.2, 3.5]  // M5
];

// sizes for cylinder screw heads
screw_cyl=[
//   d,   h
 [ 4.5, 1.6], // M2.5
 [ 5.5, 2.0], // M3
 [ 7.0, 2.6], // M4
 [ 8.5, 3.3]  // M5
];

// sizes for countersunk screw heads
screw_cnt=[
//   d,   h
 [ 4.7, 1.50], // M2.5
 [ 5.6, 1.65], // M3
 [ 7.4, 2.20], // M4
 [ 9.2, 2.50]  // M5
];
// file: ../motherboard/motherboard_dim.scad
include <../library/linurs/linurs_screw_dim.scad>
include <../library/din41612/din41612_female_dim.scad>
include <../library/din41612/din41612_male_dim.scad>
include <../pcb/pcb_dim.scad>
// motherboard pcb dimensions
motherboard_l=pcb_l;   // pcb width
motherboard_h=1.6;     // pcb thickness
step=25.4;             // distance between modules

function motherboard_w(n)=din41612_female_w+step*(n-1);

screw_motherboard_d=M2_5;
screw_motherboard_l=16;
motherboard_pass=0.5;// gap to fit screws 

motherboard_z_offset=-din41612_male_w1-din41612_female_h1-motherboard_h;
// file: ../bracket/bracket_dim.scad
// bracket

include <../pcb/pcb_dim.scad>
include <../motherboard/motherboard_dim.scad>
include <../library/linurs/linurs_screw_dim.scad>

bracket_screw=M2_5;   // hole for the screw

bracket_gap=0.5;      // gap between bracket to make sure it fits in the box
bracket_screw_gap=0.5;// gap to fit the screw

bracket_l=pcb_w+15;   // height of bracket
bracket_l1=19;        // hole l
bracket_l2=3*screw_d[bracket_screw];
bracket_ld=pcb_wd;    // hole distance

bracket_h=10;         // depth of the U shape at the side of the screw
bracket_h1=4;         // depth of the U shape at the side where no screw is 
bracket_h2=2-bracket_gap/2;   // thickness of bracket
bracket_h3=5;         // hole h

bracket_w1=4;         // height of the mounting hole cube
bracket_tn=2;         // thickness of bracket
bracket_t=bracket_tn-bracket_gap/2;  // thickness of bracket - gap

bracket_offset_z=-10;  // bracket offset in elecbox z axis

function bracket_w(n)=step*n-bracket_gap;
function bracket_w2(n)=step*n-2*bracket_tn;
// file: ../pcb/pcb_dim.scad
// The pcb is the master object of the project
// therefore no other include files from other objects
// are necessary

// pcb constants
pcb_l =100;  // lenght of the pcb
pcb_ld = 94; // hole distance 
pcb_w=80;    // height of the pcb
pcb_wd = 67; // hole distance
pcb_wd1 = 9; // hole to edge distance 
pcb_d=3;     // diameter of holes
pcb_h=1.6;   // thickness
// main file
// Potentiometer module
// ==========

Potentiometer="assembly"; // [assembly,front,back,print_front,print_back]

include <../pcb/pcb_dim.scad>
include <../bracket/bracket_dim.scad>
include <../motherboard/motherboard_dim.scad>
include <../library/linurs/linurs_screw_dim.scad>

use <../library/linurs/linurs_screw.scad>
use <../bracket/bracket.scad>
use <../pcb/pcb.scad>

module Potentiometer_back(){
    translate([0,0,bracket_offset_z])back_bracket(n=1);
}

module Potentiometer_front(){
    dadj=4;
    dpot=8;
  
    hadj=4.5;
    hpot=9;
 
    zpot=30;
    zadj=22.5;
       difference(){
        translate([0,0,bracket_offset_z])front_bracket(n=1);
        
        translate([
          0,
          hadj+pcb_h,
          zpot-zadj/2])rotate([0,90,0])
          cylinder(h=bracket_h,d=dadj,center=true, $fn=16); 
      
       translate([
          0,
          hpot+pcb_h,
          zpot])rotate([0,90,0])
          cylinder(h=bracket_h,d=dpot,center=true, $fn=16);     
        
       translate([
          0,
          hadj+pcb_h,
          zpot+zadj/2])rotate([0,90,0])
          cylinder(h=bracket_h,d=dadj,center=true, $fn=16);        
    }
}

module Potentiometer_assembly(){
    pcb_assembly();
    Potentiometer_front();
    translate([pcb_l,0,0])Potentiometer_back();
}

if(Potentiometer=="front"){
  Potentiometer_front();
}

if(Potentiometer=="back"){
  Potentiometer_back();
}

if(Potentiometer=="assembly"){
  Potentiometer_assembly();
}

if(Potentiometer=="print_front"){
  rotate([0,-90,0])
    Potentiometer_front();
}

if(Potentiometer=="print_back"){
  rotate([0,90,0])Potentiometer_back();
}
